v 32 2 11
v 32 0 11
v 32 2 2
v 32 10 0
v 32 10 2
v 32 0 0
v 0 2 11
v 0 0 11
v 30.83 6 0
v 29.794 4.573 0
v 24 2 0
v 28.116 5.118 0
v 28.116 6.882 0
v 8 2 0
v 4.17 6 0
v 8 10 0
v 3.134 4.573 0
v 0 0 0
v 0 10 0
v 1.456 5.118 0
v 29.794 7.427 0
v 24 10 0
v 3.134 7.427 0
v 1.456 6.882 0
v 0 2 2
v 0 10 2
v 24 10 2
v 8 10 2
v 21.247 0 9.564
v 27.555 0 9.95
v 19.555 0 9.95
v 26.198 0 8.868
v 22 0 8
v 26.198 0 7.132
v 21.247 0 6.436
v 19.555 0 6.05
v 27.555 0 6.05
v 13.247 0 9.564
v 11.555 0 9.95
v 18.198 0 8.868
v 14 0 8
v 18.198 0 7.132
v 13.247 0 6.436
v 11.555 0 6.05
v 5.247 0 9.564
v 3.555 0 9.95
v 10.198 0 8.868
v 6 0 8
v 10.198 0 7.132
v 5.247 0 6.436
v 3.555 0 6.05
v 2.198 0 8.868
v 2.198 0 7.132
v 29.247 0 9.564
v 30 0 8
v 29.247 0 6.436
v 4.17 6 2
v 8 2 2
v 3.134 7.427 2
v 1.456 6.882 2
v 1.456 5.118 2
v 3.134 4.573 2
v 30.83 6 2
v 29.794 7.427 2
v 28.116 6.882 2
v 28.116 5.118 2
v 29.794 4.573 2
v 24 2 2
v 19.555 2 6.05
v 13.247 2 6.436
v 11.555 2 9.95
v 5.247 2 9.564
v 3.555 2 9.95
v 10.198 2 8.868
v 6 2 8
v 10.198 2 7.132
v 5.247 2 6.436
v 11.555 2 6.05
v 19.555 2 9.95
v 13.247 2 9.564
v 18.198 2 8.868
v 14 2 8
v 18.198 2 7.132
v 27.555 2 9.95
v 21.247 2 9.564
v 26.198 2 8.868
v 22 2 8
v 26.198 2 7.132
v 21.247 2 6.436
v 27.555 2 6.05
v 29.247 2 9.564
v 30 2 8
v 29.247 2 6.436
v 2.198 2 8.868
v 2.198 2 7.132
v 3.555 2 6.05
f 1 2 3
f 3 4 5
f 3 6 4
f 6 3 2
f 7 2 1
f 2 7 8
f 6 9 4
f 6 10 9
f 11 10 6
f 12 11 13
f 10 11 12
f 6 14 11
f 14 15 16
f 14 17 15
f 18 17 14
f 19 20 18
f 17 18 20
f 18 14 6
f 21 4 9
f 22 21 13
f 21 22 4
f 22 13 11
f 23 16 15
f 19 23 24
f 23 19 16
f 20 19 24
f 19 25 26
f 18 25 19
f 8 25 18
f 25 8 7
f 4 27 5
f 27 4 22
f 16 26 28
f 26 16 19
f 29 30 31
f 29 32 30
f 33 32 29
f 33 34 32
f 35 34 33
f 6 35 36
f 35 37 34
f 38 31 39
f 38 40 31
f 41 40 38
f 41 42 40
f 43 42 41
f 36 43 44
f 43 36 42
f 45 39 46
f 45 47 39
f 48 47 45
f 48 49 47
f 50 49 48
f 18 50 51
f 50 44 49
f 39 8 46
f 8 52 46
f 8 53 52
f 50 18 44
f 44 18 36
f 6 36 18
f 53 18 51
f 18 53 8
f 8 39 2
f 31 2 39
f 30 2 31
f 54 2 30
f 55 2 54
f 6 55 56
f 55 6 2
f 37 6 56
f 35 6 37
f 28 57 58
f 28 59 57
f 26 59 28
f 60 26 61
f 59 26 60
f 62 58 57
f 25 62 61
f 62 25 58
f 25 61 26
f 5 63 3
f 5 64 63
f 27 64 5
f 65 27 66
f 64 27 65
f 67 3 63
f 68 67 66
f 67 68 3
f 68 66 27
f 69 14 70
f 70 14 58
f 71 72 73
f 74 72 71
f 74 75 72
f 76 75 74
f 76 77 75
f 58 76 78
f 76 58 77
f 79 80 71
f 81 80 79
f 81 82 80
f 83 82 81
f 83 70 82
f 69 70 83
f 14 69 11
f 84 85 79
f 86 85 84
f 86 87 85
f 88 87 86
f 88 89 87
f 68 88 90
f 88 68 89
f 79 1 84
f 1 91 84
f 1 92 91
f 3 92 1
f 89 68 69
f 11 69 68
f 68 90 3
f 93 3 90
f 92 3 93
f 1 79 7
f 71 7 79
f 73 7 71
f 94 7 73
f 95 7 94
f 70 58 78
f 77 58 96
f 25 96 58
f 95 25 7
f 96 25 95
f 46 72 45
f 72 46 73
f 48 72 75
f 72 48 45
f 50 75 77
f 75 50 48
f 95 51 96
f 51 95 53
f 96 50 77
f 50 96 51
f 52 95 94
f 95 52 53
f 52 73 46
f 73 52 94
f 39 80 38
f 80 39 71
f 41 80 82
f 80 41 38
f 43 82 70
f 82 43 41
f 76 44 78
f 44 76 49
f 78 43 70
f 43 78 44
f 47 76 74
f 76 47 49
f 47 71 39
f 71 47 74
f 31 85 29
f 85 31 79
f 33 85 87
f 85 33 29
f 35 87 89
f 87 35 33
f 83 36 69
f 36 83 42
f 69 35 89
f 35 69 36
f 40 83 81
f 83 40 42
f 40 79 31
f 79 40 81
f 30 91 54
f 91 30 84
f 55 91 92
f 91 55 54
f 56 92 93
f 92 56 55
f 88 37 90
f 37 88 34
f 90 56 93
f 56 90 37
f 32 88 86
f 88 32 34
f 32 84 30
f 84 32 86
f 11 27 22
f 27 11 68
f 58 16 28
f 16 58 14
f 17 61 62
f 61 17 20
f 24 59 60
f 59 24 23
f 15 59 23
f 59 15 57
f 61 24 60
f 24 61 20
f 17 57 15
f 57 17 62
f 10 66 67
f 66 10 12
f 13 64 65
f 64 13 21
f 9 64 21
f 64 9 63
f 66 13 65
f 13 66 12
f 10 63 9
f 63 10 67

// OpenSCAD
nb_rangees = 4;
epaisseur = 2;
difference(){
difference(){
    cube([8*nb_rangees,10,11]);
    translate([-1, epaisseur, epaisseur]){
        cube([8*nb_rangees+2,28,28]);};
};


translate([8,epaisseur,-1]){
    cube([16, 11, epaisseur+2]);
    };

    
translate([2.67,6,-1]){
    cylinder(h=epaisseur+2, r=1.5);
    };

translate([8*nb_rangees-2.67,6,-1]){
    cylinder(h=epaisseur+2, r=1.5);
    };

translate([0,epaisseur,0]){   
    rotate([90,0,0]){
        union(){
            for(i=[0:nb_rangees-1]){
                for(j=[0:2]){
                    translate([4+ 8*i, 8+8*j, -1]){cylinder(h=epaisseur+2, r=2);}
                }
            }
        }
    }
}


}
